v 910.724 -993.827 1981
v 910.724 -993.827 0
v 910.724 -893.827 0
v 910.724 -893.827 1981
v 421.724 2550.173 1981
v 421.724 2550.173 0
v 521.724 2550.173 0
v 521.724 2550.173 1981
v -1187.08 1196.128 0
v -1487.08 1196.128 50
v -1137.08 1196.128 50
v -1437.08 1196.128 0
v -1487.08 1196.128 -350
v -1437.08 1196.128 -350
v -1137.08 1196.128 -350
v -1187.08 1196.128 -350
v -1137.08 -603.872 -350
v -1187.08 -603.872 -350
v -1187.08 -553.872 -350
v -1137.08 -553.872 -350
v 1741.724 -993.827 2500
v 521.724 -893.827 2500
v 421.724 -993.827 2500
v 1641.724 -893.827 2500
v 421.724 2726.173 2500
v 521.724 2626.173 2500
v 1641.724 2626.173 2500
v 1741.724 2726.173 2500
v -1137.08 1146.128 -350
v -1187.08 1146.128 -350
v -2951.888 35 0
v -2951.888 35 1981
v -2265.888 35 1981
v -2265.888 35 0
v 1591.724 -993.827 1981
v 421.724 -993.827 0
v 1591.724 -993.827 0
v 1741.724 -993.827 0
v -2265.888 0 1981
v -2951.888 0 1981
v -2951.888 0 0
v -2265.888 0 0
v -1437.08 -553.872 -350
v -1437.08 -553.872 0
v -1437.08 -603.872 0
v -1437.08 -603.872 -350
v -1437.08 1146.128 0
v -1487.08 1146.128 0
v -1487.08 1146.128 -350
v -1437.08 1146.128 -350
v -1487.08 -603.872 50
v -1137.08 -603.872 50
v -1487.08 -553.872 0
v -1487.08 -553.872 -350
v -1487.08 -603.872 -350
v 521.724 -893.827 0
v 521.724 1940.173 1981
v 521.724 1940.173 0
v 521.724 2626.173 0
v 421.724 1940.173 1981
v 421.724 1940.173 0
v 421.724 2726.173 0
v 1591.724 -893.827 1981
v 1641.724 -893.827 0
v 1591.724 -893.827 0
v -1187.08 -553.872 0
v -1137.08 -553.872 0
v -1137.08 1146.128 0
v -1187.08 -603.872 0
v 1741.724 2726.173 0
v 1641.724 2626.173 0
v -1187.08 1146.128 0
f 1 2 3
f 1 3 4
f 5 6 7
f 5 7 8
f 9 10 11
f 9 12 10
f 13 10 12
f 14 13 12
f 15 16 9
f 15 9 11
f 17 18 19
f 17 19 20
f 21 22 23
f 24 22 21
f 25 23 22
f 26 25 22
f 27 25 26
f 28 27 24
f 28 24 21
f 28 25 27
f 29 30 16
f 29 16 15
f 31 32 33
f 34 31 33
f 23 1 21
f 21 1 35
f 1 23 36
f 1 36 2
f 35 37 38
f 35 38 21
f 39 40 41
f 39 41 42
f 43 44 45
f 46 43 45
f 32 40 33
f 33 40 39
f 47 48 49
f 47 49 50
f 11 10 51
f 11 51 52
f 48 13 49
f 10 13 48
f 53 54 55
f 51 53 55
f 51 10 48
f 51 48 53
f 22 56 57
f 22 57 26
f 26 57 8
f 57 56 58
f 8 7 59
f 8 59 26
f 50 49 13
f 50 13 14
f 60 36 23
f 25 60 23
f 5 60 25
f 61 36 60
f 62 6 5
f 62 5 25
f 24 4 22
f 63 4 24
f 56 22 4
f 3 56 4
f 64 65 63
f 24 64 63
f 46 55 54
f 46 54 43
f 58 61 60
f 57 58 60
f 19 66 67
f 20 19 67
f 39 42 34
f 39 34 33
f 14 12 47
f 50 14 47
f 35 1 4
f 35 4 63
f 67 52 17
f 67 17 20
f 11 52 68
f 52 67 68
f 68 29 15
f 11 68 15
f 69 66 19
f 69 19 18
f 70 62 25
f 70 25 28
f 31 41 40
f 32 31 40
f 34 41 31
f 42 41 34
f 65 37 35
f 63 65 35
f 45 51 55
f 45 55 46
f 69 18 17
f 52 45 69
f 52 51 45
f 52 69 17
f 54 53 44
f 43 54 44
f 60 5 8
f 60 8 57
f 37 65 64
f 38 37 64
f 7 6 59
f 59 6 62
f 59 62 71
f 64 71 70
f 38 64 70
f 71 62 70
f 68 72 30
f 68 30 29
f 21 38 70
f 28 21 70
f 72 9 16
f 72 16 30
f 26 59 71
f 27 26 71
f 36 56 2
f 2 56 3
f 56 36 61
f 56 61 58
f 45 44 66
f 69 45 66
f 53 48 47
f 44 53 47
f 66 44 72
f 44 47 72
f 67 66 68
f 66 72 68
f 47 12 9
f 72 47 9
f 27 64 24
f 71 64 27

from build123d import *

# Parameters (mm, degrees)
F0_W      = 1320
F0_H      = 3720
F0_W_2    = 1120
F0_H_2    = 3520
F1_DEPTH  = 2500
F2_W      = 681
F2_H      = 1981
F3_DEPTH  = 100
F4_W      = 350
F4_H      = 1800
F5_DEPTH  = 50
F6_W      = 50
F6_H      = 50
F7_DEPTH  = 350
F8_W      = 610
F8_H      = 1981
F9_DEPTH  = 100
F10_W     = 686
F10_H     = 1981
F11_DEPTH = 35


with BuildPart() as f1:
    # F0 (on Top) → F1 (new body)
    with BuildSketch(Plane.XY):
        with Locations((1081.723574, 866.172806)):
            Rectangle(F0_W, F0_H)
        with Locations((1081.723574, 866.172806)):
            Rectangle(F0_W_2, F0_H_2, mode=Mode.SUBTRACT)
    extrude(amount=F1_DEPTH)

    # F2 (on face) → F3 (cut, through all)
    with BuildSketch(Plane.XZ.offset(993.827194)):
        with Locations((1251.223574, 990.5)):
            Rectangle(F2_W, F2_H)
    extrude(amount=-F3_DEPTH, mode=Mode.SUBTRACT)

    # F8 (on face) → F9 (cut, through all)
    with BuildSketch(Plane(origin=(421.723574, 0, 0), x_dir=(0, -1, 0), z_dir=(-1, 0, 0))):
        with Locations((-2245.172806, 990.5)):
            Rectangle(F8_W, F8_H)
    extrude(amount=-F9_DEPTH, mode=Mode.SUBTRACT)


with BuildPart() as f5:
    # F4 (on Top) → F5 (new body)
    with BuildSketch(Plane.XY):
        with Locations((-1312.079501, 296.127999)):
            Rectangle(F4_W, F4_H)
    extrude(amount=F5_DEPTH)

    # F6 (on face) → F7 (join)
    with BuildSketch(Plane(origin=(0, 0, 0), x_dir=(1, 0, 0), z_dir=(0, 0, -1))):
        with Locations((-1462.079501, 578.872001)):
            Rectangle(F6_W, F6_H)
        with Locations((-1162.079501, 578.872001)):
            Rectangle(F6_W, F6_H)
        with Locations((-1162.079501, -1171.127999)):
            Rectangle(F6_W, F6_H)
        with Locations((-1462.079501, -1171.127999)):
            Rectangle(F6_W, F6_H)
    extrude(amount=F7_DEPTH)


with BuildPart() as f11:
    # F10 (on Front) → F11 (new body)
    with BuildSketch(Plane.XZ):
        with Locations((-2608.887846, 990.5)):
            Rectangle(F10_W, F10_H)
    extrude(amount=-F11_DEPTH)


solid = Compound([f1.part, f5.part, f11.part])
